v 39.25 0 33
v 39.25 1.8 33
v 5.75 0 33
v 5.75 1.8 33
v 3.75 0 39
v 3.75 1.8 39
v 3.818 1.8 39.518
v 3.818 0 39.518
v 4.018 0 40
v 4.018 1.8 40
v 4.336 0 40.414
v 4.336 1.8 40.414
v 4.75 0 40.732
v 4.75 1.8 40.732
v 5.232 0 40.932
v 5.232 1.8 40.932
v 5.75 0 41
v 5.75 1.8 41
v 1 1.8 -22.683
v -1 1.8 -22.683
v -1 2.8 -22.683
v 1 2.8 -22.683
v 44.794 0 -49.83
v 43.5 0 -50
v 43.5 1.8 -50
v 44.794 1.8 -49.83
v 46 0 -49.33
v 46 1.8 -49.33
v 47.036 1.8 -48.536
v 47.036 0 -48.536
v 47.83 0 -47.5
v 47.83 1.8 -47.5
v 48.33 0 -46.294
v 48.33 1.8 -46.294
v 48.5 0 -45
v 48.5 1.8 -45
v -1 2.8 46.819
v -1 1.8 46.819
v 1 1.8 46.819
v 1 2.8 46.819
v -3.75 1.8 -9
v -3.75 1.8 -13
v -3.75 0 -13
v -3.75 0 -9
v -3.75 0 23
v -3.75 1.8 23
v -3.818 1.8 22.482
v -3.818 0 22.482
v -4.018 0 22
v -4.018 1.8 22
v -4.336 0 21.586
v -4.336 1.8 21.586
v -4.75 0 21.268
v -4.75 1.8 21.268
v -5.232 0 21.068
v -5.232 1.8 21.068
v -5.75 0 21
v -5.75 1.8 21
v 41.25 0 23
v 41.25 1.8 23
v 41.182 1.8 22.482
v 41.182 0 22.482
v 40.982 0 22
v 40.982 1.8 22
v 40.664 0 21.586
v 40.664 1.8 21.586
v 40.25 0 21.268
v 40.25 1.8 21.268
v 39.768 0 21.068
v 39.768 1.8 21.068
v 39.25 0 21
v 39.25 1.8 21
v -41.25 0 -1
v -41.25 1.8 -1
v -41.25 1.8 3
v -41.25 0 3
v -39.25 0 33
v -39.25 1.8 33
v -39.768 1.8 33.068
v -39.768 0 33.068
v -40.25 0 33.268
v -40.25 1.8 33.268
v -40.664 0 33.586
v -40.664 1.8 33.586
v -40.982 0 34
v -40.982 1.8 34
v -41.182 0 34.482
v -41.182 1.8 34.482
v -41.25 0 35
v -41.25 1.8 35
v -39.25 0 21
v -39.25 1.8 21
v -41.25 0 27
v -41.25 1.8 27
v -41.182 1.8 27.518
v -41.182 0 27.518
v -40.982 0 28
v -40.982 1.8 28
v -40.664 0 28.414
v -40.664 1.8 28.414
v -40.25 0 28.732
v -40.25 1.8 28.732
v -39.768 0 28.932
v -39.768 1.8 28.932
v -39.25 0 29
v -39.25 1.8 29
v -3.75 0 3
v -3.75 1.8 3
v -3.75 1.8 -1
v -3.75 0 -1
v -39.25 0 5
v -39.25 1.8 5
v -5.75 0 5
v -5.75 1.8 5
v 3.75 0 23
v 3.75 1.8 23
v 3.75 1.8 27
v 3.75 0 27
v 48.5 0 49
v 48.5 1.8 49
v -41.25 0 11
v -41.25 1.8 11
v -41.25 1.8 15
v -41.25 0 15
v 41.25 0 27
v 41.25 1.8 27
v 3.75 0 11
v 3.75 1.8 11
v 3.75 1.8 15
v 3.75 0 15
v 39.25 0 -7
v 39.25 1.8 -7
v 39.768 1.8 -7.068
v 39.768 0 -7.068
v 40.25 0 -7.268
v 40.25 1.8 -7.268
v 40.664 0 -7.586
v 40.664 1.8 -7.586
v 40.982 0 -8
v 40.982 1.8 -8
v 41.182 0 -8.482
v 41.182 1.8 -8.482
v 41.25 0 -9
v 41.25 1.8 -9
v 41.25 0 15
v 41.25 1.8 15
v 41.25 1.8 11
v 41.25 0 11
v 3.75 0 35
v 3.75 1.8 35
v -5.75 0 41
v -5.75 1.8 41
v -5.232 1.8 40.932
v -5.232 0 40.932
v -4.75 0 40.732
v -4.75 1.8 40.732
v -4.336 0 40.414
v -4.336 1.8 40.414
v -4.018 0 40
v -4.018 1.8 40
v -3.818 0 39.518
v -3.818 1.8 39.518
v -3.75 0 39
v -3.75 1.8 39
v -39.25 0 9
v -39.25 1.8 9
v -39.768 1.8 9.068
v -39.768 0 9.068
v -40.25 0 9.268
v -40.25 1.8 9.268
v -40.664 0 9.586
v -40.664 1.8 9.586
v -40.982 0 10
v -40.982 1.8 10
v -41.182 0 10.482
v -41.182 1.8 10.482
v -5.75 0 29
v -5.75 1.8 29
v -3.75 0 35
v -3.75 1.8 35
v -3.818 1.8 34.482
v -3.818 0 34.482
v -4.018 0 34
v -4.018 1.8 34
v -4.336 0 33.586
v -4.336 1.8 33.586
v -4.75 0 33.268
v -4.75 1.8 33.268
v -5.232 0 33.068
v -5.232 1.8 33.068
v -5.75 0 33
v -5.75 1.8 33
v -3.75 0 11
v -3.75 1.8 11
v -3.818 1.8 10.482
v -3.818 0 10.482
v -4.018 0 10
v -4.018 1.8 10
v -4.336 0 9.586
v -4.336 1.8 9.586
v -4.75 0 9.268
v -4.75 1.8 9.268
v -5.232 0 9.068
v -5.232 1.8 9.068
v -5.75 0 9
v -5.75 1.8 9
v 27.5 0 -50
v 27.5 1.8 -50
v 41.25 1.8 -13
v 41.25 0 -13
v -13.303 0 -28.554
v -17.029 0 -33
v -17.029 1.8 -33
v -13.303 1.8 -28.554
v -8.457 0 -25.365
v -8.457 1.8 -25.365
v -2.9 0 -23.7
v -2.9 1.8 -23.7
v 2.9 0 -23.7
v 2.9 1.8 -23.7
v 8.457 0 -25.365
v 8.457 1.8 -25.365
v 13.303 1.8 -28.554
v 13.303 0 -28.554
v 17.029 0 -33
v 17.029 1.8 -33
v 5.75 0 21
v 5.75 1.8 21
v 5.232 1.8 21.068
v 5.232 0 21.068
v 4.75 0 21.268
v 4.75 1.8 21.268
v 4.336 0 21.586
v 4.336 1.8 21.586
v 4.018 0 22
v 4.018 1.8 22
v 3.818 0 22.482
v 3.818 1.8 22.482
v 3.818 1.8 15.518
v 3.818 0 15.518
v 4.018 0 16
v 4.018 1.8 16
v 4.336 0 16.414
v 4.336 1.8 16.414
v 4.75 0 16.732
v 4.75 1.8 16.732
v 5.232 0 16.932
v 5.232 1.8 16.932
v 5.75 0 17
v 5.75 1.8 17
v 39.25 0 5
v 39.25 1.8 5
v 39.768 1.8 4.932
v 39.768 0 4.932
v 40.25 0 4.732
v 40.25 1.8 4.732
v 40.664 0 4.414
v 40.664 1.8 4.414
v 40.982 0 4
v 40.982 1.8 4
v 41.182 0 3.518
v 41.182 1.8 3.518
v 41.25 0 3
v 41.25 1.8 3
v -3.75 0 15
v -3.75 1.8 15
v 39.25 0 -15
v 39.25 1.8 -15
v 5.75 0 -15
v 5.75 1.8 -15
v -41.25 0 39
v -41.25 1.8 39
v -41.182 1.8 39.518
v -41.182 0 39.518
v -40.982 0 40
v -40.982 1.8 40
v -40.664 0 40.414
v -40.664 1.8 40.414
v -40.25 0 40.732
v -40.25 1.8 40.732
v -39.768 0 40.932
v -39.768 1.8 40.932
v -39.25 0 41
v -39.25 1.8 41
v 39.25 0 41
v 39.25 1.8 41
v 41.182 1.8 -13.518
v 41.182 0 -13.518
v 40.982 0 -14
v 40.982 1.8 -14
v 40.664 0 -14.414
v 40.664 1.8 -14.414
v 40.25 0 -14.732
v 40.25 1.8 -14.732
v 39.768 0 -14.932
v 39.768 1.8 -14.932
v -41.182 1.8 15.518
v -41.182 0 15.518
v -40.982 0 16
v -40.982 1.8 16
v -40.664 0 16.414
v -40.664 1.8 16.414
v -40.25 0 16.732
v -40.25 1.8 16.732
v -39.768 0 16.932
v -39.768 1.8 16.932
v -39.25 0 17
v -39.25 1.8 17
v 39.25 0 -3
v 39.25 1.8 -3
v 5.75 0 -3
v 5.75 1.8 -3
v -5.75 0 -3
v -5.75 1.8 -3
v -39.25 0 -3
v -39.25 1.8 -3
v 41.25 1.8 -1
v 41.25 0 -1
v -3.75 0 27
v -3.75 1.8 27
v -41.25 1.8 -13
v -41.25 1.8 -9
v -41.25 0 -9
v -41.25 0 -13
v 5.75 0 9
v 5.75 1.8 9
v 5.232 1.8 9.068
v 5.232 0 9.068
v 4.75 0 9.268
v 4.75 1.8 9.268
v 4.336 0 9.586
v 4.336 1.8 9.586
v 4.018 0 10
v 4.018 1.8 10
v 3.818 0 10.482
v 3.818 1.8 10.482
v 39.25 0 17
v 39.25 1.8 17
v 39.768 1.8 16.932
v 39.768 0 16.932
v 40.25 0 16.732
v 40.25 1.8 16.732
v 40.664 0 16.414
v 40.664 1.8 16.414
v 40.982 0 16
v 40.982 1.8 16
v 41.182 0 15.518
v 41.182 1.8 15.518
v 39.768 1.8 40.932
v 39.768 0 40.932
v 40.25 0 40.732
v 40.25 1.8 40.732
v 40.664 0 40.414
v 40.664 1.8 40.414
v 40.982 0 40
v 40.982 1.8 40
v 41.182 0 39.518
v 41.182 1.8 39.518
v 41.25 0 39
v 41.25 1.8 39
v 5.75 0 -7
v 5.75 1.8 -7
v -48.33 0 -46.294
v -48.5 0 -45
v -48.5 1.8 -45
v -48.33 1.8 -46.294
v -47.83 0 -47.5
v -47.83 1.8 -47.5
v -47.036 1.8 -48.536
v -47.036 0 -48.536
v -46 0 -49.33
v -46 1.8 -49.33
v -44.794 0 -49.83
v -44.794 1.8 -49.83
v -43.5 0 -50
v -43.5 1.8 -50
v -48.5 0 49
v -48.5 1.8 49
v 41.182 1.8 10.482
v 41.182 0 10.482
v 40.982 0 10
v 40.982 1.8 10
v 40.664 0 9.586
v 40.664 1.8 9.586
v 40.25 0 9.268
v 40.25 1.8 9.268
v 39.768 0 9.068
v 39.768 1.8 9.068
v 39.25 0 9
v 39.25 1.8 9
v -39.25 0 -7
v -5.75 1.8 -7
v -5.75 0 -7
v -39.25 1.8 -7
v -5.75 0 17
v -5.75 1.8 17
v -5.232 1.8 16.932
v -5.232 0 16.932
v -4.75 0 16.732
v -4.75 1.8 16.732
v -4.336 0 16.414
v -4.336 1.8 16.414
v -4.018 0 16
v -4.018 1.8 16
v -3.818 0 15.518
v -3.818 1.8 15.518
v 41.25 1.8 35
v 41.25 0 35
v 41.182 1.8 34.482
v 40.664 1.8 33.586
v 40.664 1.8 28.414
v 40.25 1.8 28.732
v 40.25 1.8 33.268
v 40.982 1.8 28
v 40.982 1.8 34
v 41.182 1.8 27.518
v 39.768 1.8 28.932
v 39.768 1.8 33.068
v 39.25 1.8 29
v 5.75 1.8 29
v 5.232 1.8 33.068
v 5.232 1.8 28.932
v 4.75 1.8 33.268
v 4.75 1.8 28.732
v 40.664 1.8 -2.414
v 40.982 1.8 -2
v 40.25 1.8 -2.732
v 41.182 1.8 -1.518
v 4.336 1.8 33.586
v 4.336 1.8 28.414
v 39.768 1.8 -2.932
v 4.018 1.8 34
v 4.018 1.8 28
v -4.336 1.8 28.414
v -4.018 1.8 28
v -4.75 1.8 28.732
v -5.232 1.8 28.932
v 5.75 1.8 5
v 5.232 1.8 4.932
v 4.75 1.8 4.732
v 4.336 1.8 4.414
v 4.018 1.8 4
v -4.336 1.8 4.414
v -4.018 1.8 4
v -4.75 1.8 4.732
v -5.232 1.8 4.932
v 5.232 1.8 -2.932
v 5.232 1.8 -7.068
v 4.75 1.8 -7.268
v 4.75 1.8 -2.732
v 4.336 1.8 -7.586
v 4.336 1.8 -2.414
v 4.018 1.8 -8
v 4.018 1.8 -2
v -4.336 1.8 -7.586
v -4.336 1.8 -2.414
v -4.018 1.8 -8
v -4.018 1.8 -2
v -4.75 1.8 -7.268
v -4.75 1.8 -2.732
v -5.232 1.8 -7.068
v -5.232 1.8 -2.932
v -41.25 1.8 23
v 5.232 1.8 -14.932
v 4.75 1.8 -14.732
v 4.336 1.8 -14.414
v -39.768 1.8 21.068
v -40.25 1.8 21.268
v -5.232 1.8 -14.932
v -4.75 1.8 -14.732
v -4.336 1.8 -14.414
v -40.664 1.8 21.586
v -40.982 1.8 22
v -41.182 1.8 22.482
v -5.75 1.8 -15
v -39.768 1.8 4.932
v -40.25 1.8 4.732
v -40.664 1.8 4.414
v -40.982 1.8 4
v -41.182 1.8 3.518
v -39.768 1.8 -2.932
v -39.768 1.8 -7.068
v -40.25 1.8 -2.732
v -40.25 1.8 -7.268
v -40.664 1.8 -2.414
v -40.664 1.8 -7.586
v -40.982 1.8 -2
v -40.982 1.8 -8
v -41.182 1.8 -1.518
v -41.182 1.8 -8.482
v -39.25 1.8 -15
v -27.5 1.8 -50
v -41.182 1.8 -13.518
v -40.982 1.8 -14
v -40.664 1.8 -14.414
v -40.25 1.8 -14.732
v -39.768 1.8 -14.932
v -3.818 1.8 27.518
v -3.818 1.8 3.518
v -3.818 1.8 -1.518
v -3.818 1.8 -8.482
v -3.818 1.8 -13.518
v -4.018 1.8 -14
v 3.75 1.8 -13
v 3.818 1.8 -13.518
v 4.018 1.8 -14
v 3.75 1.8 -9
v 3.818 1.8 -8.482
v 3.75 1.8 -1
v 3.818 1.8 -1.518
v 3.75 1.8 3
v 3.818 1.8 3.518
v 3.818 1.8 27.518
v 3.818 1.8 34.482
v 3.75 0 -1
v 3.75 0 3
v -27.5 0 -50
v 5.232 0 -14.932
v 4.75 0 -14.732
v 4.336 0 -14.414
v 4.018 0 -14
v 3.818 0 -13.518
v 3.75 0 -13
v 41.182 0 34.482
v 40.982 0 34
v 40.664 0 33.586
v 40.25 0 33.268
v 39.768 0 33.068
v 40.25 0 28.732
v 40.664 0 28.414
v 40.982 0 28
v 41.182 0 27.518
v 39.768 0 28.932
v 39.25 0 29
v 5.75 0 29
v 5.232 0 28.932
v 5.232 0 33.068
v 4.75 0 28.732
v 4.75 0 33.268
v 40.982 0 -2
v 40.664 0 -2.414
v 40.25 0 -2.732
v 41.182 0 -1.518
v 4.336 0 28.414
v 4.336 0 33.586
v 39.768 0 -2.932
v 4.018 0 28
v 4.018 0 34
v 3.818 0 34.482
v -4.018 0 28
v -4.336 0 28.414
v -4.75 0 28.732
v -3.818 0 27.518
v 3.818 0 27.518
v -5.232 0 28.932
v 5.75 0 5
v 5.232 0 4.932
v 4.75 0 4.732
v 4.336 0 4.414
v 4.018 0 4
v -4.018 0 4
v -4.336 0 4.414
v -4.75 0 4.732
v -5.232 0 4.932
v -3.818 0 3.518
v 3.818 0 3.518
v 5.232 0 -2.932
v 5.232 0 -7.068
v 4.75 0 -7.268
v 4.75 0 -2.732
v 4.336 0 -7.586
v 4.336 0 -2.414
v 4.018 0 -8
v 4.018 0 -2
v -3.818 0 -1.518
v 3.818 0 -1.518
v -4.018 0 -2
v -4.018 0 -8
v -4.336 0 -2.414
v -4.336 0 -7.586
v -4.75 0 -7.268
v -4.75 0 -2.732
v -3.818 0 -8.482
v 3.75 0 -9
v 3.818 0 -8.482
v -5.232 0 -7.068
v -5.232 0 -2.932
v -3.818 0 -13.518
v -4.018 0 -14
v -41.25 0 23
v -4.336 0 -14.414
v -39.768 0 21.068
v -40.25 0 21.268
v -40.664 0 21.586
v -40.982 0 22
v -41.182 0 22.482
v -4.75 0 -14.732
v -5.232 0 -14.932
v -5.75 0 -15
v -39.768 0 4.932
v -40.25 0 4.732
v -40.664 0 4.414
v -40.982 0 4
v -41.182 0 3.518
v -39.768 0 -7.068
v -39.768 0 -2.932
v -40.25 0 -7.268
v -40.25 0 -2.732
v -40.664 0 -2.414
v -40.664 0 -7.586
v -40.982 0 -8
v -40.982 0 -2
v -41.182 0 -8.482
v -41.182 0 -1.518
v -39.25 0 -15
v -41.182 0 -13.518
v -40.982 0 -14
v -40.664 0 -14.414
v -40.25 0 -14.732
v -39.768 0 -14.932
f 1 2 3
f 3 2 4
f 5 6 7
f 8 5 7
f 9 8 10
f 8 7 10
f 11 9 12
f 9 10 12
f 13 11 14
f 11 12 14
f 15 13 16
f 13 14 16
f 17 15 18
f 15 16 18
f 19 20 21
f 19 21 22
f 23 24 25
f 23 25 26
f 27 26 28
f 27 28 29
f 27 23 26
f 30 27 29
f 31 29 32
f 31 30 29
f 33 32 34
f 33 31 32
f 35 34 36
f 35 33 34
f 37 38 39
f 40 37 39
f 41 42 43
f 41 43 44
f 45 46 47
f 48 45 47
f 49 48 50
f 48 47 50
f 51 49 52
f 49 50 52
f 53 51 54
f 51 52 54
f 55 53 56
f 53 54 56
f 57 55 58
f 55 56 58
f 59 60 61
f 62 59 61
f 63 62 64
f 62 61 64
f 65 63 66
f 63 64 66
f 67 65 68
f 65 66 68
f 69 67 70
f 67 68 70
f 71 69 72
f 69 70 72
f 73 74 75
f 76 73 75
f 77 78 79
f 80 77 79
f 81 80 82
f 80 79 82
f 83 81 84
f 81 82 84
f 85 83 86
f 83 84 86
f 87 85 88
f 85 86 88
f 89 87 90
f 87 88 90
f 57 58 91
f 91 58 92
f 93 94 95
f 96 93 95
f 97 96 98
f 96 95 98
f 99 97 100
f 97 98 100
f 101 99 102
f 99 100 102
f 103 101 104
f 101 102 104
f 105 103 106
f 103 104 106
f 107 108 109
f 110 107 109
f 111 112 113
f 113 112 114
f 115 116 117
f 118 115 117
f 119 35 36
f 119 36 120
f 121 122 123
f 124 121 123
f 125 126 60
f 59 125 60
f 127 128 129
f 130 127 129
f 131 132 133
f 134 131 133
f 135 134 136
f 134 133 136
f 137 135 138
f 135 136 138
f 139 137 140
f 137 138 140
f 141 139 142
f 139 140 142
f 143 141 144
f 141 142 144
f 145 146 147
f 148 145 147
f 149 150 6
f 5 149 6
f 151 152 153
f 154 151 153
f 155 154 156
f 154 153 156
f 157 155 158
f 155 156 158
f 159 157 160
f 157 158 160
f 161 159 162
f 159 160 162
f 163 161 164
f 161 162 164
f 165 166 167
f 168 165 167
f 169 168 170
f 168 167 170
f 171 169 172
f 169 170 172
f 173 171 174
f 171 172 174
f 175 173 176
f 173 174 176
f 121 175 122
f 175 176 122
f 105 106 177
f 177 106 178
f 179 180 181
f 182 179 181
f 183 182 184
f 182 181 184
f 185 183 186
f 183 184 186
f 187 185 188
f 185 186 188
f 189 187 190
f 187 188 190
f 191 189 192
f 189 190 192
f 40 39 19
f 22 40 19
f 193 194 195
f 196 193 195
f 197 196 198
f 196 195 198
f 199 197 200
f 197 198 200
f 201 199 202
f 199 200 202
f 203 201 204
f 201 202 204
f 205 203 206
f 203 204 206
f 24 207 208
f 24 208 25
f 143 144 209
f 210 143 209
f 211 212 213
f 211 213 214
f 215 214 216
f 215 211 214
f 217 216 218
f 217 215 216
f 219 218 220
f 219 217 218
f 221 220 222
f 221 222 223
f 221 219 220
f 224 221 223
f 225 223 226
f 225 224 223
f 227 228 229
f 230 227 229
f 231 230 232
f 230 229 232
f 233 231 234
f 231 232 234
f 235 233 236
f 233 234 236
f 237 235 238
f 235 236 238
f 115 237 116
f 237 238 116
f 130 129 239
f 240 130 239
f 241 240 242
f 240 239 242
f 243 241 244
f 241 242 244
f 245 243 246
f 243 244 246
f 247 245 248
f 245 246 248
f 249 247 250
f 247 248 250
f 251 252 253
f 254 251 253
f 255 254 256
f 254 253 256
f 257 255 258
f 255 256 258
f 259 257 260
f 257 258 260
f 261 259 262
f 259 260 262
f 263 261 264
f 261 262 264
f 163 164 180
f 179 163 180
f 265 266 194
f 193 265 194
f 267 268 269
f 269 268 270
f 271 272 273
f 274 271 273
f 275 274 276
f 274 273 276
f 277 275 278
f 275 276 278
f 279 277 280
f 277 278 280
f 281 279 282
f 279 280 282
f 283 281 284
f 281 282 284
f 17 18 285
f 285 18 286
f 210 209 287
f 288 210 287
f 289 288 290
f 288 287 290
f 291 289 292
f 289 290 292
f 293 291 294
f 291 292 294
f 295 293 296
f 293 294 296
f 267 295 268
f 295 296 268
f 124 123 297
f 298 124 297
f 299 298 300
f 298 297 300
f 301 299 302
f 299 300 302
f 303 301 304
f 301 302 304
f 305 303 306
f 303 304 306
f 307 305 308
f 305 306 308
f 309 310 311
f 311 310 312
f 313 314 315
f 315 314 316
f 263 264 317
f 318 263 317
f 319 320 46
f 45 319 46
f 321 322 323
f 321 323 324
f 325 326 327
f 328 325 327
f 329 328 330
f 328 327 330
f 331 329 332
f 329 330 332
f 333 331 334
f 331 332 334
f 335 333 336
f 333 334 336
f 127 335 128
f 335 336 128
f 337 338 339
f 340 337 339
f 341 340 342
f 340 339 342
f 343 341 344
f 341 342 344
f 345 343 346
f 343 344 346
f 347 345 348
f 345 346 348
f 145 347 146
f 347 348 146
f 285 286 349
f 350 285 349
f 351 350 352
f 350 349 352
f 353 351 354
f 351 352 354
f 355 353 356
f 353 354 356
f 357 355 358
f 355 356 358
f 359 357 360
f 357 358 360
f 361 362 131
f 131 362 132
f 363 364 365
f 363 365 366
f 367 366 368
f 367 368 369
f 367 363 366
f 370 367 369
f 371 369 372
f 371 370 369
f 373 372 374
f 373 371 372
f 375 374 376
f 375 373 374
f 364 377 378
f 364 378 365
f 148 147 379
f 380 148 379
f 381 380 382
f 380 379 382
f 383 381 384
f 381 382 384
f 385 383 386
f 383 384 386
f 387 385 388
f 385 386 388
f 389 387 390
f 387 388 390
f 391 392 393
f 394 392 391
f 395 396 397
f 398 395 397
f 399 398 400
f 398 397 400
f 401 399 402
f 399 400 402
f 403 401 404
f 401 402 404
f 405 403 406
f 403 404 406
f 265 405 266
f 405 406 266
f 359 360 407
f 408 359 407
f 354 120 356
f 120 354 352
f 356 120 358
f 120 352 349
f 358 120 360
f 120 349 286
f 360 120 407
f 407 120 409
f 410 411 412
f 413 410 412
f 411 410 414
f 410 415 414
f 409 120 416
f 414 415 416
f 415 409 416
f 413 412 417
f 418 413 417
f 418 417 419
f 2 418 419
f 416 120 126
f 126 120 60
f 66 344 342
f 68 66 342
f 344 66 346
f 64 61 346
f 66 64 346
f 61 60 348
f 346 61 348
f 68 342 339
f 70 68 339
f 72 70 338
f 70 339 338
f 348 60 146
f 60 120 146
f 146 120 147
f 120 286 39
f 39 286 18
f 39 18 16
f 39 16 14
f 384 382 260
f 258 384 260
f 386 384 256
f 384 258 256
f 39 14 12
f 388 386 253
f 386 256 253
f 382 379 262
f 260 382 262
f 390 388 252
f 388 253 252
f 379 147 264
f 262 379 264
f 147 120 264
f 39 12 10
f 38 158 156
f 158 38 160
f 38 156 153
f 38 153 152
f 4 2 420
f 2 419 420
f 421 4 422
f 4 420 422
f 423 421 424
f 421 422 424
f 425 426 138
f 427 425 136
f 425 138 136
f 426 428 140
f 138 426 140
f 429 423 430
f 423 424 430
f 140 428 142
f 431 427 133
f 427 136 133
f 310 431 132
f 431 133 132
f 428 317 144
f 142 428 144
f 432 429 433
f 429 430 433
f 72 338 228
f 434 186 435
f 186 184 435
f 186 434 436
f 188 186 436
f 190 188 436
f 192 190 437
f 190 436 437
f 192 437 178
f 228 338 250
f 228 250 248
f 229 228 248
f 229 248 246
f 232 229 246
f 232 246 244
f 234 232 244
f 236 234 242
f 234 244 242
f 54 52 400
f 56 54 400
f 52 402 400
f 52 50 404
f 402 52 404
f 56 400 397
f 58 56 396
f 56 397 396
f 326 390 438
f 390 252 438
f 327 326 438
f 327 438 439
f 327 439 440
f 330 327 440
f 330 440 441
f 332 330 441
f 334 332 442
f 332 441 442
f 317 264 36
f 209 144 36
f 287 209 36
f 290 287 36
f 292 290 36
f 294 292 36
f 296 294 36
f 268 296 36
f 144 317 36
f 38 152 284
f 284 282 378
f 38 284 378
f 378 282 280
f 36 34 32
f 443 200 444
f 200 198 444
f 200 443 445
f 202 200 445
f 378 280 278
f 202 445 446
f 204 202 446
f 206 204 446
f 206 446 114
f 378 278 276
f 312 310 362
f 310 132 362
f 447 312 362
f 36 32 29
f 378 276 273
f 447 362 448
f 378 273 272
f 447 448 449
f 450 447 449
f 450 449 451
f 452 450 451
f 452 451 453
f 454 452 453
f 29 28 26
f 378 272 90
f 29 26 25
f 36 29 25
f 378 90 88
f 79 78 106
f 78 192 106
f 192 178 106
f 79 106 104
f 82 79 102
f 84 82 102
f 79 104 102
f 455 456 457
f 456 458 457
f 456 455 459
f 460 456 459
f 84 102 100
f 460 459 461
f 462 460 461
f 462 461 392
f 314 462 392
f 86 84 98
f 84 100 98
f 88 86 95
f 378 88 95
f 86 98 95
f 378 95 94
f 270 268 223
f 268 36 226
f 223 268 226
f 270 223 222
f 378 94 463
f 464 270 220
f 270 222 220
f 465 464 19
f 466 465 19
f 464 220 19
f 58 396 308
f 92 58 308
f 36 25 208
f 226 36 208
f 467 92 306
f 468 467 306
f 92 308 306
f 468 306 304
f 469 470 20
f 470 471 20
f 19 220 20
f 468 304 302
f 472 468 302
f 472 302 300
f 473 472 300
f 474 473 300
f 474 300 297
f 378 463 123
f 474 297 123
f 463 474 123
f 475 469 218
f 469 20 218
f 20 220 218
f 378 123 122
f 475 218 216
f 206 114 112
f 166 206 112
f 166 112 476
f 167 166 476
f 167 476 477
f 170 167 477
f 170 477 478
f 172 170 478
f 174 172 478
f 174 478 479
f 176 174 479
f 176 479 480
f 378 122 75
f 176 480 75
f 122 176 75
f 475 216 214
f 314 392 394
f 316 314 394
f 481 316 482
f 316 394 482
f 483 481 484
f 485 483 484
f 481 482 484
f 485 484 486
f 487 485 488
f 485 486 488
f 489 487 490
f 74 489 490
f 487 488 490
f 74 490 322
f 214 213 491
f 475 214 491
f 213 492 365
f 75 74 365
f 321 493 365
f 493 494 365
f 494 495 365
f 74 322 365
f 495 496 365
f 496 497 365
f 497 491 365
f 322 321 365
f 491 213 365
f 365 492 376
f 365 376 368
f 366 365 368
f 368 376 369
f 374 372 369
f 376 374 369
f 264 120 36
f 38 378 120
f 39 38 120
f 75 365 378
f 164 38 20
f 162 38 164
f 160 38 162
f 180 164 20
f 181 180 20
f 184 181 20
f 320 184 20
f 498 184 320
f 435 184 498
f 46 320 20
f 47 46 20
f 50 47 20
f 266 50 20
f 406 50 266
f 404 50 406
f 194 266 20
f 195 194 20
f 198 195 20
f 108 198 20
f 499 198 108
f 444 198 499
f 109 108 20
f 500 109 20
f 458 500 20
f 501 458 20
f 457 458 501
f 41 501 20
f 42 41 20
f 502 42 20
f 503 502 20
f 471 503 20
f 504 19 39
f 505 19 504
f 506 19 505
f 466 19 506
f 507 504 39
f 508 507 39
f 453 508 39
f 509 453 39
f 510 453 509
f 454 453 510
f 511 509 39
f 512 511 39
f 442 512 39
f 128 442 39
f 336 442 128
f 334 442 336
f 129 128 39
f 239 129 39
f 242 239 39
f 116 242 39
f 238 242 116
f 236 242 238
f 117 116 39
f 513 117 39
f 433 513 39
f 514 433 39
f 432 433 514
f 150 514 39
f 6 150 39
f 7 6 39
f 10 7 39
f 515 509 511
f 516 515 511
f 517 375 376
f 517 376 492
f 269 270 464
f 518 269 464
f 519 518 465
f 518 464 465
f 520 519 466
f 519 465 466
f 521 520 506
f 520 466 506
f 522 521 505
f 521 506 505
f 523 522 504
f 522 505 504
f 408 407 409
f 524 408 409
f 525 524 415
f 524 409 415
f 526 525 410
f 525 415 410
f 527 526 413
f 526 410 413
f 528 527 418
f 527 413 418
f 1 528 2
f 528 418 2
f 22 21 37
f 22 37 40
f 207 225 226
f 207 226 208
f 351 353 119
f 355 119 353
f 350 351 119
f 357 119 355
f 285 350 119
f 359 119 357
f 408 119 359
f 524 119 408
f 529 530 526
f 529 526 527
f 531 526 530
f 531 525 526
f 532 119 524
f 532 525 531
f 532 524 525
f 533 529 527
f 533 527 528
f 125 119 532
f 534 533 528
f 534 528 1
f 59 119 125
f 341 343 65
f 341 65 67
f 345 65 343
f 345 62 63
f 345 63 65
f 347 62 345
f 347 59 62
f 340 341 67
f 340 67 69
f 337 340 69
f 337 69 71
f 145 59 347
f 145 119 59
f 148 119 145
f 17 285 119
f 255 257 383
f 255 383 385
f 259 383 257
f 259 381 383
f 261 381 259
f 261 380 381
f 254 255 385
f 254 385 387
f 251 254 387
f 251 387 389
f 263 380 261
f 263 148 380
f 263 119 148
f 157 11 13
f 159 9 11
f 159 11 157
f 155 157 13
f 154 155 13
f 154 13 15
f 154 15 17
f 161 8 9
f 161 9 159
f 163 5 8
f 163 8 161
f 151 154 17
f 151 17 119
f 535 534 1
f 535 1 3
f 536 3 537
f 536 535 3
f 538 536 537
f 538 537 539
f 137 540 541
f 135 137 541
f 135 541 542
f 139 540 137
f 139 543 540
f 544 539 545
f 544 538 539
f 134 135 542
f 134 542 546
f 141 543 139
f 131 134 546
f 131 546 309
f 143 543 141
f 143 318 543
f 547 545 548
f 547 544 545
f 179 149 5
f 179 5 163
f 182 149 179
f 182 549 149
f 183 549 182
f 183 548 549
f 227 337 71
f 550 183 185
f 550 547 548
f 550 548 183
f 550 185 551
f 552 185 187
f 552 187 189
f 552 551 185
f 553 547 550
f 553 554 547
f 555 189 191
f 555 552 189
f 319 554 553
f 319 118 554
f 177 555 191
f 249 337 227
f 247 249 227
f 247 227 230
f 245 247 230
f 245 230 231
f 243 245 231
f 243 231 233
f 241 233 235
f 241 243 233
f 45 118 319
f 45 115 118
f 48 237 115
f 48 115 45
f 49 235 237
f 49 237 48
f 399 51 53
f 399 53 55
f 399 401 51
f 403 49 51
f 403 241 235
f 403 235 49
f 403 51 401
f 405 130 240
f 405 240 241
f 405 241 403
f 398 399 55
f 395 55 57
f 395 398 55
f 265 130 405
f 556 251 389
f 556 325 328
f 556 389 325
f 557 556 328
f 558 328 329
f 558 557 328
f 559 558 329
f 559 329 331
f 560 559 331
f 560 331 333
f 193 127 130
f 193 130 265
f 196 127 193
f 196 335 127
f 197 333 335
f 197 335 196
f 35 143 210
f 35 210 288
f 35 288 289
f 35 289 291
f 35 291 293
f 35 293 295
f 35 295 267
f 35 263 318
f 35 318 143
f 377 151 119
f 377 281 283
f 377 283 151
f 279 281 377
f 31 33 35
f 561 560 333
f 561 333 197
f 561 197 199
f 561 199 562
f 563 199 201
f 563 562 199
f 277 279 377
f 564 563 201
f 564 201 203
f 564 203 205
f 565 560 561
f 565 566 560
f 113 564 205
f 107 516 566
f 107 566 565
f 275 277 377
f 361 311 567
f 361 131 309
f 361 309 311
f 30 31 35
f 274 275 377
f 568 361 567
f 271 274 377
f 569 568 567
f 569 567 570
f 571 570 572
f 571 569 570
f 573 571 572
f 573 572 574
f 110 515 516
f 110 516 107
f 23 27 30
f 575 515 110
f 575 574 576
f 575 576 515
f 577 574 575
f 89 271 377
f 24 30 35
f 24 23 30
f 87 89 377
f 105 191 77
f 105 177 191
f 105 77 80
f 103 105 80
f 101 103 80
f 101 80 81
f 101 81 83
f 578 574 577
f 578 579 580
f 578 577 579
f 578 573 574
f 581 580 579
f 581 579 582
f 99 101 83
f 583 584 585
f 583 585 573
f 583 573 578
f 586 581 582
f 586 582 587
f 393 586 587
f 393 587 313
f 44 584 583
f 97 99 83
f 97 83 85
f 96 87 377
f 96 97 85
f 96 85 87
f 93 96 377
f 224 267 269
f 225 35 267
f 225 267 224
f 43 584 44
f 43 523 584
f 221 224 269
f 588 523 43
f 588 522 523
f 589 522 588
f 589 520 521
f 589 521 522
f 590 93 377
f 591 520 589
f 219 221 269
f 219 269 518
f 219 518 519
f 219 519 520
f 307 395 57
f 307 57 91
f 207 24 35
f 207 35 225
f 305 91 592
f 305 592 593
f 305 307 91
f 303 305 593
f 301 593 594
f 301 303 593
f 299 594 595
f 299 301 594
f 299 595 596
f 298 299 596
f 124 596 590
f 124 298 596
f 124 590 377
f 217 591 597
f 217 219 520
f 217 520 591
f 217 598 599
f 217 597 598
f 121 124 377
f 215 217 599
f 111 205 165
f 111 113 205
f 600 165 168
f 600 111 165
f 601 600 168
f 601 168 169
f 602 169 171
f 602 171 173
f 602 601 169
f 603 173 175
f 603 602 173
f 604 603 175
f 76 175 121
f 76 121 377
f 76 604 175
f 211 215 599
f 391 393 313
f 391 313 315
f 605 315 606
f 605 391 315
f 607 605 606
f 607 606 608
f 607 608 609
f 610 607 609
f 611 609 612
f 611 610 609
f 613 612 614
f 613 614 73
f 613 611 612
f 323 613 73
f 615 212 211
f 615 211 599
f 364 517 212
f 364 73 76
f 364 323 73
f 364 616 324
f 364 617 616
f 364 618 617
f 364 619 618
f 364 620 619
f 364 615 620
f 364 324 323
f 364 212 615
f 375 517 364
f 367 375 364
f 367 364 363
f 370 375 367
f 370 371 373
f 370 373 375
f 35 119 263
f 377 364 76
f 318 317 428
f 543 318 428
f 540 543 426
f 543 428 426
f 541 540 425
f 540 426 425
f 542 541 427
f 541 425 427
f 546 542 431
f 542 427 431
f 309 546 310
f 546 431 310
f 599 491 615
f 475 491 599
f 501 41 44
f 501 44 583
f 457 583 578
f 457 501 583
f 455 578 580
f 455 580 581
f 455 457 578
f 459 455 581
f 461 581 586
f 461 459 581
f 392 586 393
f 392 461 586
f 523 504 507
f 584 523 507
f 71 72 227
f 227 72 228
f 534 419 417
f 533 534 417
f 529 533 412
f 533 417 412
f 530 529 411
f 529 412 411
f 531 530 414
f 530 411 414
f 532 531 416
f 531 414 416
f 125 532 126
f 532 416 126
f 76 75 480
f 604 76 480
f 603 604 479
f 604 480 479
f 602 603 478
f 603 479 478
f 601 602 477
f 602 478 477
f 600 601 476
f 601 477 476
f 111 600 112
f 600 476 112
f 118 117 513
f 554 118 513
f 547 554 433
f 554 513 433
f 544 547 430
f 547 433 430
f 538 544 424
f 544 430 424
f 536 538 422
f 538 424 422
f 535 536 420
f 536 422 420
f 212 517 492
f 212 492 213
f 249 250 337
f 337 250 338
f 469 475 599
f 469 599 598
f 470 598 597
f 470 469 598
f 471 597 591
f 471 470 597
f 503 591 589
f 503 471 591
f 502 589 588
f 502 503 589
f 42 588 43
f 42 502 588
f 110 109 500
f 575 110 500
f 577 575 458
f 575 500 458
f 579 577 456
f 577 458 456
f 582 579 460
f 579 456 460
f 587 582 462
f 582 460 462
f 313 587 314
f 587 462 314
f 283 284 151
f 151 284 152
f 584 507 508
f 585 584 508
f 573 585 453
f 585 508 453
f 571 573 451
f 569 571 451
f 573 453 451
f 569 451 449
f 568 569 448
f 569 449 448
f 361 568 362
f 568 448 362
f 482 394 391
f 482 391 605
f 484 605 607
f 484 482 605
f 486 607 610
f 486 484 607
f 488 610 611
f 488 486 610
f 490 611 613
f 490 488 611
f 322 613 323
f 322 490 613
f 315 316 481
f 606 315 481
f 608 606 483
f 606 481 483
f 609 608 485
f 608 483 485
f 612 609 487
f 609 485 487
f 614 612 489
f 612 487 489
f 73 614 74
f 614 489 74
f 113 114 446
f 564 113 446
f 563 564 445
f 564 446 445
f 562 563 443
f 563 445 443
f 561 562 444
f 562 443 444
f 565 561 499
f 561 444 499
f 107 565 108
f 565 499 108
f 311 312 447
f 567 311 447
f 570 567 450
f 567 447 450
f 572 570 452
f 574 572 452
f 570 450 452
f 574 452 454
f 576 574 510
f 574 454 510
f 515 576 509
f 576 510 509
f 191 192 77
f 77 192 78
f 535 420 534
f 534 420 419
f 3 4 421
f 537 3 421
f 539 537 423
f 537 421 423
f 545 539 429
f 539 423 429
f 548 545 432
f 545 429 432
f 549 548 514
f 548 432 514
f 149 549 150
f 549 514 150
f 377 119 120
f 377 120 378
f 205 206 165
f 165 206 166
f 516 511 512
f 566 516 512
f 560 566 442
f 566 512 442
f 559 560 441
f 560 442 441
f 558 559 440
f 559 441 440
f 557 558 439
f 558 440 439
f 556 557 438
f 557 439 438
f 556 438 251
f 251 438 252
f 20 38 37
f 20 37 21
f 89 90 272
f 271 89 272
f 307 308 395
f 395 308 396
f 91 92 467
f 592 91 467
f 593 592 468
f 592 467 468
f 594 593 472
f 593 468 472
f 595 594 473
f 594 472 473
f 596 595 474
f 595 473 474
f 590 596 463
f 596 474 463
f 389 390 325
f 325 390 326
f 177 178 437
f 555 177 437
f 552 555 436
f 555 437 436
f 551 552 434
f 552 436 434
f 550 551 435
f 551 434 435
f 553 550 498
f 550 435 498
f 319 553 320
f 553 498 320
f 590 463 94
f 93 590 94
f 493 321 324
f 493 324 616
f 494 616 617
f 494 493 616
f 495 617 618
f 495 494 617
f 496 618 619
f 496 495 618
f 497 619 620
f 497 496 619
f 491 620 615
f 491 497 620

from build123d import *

# Parameters (mm, degrees)
GRUNDK_RPER_DEPTH = 1.8
L_FTUNGEN_DEPTH   = 1.8
SKIZZE4_W         = 2
SKIZZE4_H         = 69.501766887
STREBE_DEPTH      = 1


with BuildPart() as part:
    # Skizze2 → Grundkörper (new body)
    with BuildSketch(Plane(origin=(0, 0, 0), x_dir=(1, 0, 0), z_dir=(0, 1, 0))):
        with BuildLine():
            Line((-43.5, 50), (-27.5, 50))
            Line((-27.5, 50), (-17.028881642, 33))
            ThreePointArc((-17.028881642, 33), (0, 23.488907952), (17.028881642, 33))
            Line((17.028881642, 33), (27.5, 50))
            Line((27.5, 50), (43.5, 50))
            ThreePointArc((43.5, 50), (47.035533906, 48.535533906), (48.5, 45))
            Line((48.5, 45), (48.5, -49))
            Line((48.5, -49), (-48.5, -49))
            Line((-48.5, -49), (-48.5, 45))
            ThreePointArc((-48.5, 45), (-47.035533906, 48.535533906), (-43.5, 50))
        make_face()
    extrude(amount=GRUNDK_RPER_DEPTH)

    # Skizze3 → Lüftungen (cut)
    with BuildSketch(Plane(origin=(0, 1.8, 0), x_dir=(1, 0, 0), z_dir=(0, 1, 0))):
        with BuildLine():
            Line((-39.25, 15), (-5.75, 15))
            ThreePointArc((-5.75, 15), (-4.335786438, 14.414213562), (-3.75, 13))
            Line((-3.75, 13), (-3.75, 9))
            ThreePointArc((-3.75, 9), (-4.335786438, 7.585786438), (-5.75, 7))
            Line((-5.75, 7), (-39.25, 7))
            ThreePointArc((-39.25, 7), (-40.664213562, 7.585786438), (-41.25, 9))
            Line((-41.25, 9), (-41.25, 13))
            ThreePointArc((-41.25, 13), (-40.664213562, 14.414213562), (-39.25, 15))
        make_face()
        with BuildLine():
            Line((3.75, 13), (3.75, 9))
            ThreePointArc((3.75, 9), (4.335786438, 7.585786438), (5.75, 7))
            Line((5.75, 7), (39.25, 7))
            ThreePointArc((39.25, 7), (40.664213562, 7.585786438), (41.25, 9))
            Line((41.25, 9), (41.25, 13))
            ThreePointArc((41.25, 13), (40.664213562, 14.414213562), (39.25, 15))
            Line((39.25, 15), (5.75, 15))
            ThreePointArc((5.75, 15), (4.335786438, 14.414213562), (3.75, 13))
        make_face()
        with BuildLine():
            Line((3.75, 1), (3.75, -3))
            ThreePointArc((3.75, -3), (4.335786438, -4.414213562), (5.75, -5))
            Line((5.75, -5), (39.25, -5))
            ThreePointArc((39.25, -5), (40.664213562, -4.414213562), (41.25, -3))
            Line((41.25, -3), (41.25, 1))
            ThreePointArc((41.25, 1), (40.664213562, 2.414213562), (39.25, 3))
            Line((39.25, 3), (5.75, 3))
            ThreePointArc((5.75, 3), (4.335786438, 2.414213562), (3.75, 1))
        make_face()
        with BuildLine():
            Line((3.75, -11), (3.75, -15))
            ThreePointArc((3.75, -15), (4.335786438, -16.414213562), (5.75, -17))
            Line((5.75, -17), (39.25, -17))
            ThreePointArc((39.25, -17), (40.664213562, -16.414213562), (41.25, -15))
            Line((41.25, -15), (41.25, -11))
            ThreePointArc((41.25, -11), (40.664213562, -9.585786438), (39.25, -9))
            Line((39.25, -9), (5.75, -9))
            ThreePointArc((5.75, -9), (4.335786438, -9.585786438), (3.75, -11))
        make_face()
        with BuildLine():
            Line((3.75, -23), (3.75, -27))
            ThreePointArc((3.75, -27), (4.335786438, -28.414213562), (5.75, -29))
            Line((5.75, -29), (39.25, -29))
            ThreePointArc((39.25, -29), (40.664213562, -28.414213562), (41.25, -27))
            Line((41.25, -27), (41.25, -23))
            ThreePointArc((41.25, -23), (40.664213562, -21.585786438), (39.25, -21))
            Line((39.25, -21), (5.75, -21))
            ThreePointArc((5.75, -21), (4.335786438, -21.585786438), (3.75, -23))
        make_face()
        with BuildLine():
            Line((3.75, -35), (3.75, -39))
            ThreePointArc((3.75, -39), (4.335786438, -40.414213562), (5.75, -41))
            Line((5.75, -41), (39.25, -41))
            ThreePointArc((39.25, -41), (40.664213562, -40.414213562), (41.25, -39))
            Line((41.25, -39), (41.25, -35))
            ThreePointArc((41.25, -35), (40.664213562, -33.585786438), (39.25, -33))
            Line((39.25, -33), (5.75, -33))
            ThreePointArc((5.75, -33), (4.335786438, -33.585786438), (3.75, -35))
        make_face()
        with BuildLine():
            Line((-41.25, 1), (-41.25, -3))
            ThreePointArc((-41.25, -3), (-40.664213562, -4.414213562), (-39.25, -5))
            Line((-39.25, -5), (-5.75, -5))
            ThreePointArc((-5.75, -5), (-4.335786438, -4.414213562), (-3.75, -3))
            Line((-3.75, -3), (-3.75, 1))
            ThreePointArc((-3.75, 1), (-4.335786438, 2.414213562), (-5.75, 3))
            Line((-5.75, 3), (-39.25, 3))
            ThreePointArc((-39.25, 3), (-40.664213562, 2.414213562), (-41.25, 1))
        make_face()
        with BuildLine():
            Line((-41.25, -11), (-41.25, -15))
            ThreePointArc((-41.25, -15), (-40.664213562, -16.414213562), (-39.25, -17))
            Line((-39.25, -17), (-5.75, -17))
            ThreePointArc((-5.75, -17), (-4.335786438, -16.414213562), (-3.75, -15))
            Line((-3.75, -15), (-3.75, -11))
            ThreePointArc((-3.75, -11), (-4.335786438, -9.585786438), (-5.75, -9))
            Line((-5.75, -9), (-39.25, -9))
            ThreePointArc((-39.25, -9), (-40.664213562, -9.585786438), (-41.25, -11))
        make_face()
        with BuildLine():
            Line((-41.25, -23), (-41.25, -27))
            ThreePointArc((-41.25, -27), (-40.664213562, -28.414213562), (-39.25, -29))
            Line((-39.25, -29), (-5.75, -29))
            ThreePointArc((-5.75, -29), (-4.335786438, -28.414213562), (-3.75, -27))
            Line((-3.75, -27), (-3.75, -23))
            ThreePointArc((-3.75, -23), (-4.335786438, -21.585786438), (-5.75, -21))
            Line((-5.75, -21), (-39.25, -21))
            ThreePointArc((-39.25, -21), (-40.664213562, -21.585786438), (-41.25, -23))
        make_face()
        with BuildLine():
            Line((-41.25, -35), (-41.25, -39))
            ThreePointArc((-41.25, -39), (-40.664213562, -40.414213562), (-39.25, -41))
            Line((-39.25, -41), (-5.75, -41))
            ThreePointArc((-5.75, -41), (-4.335786438, -40.414213562), (-3.75, -39))
            Line((-3.75, -39), (-3.75, -35))
            ThreePointArc((-3.75, -35), (-4.335786438, -33.585786438), (-5.75, -33))
            Line((-5.75, -33), (-39.25, -33))
            ThreePointArc((-39.25, -33), (-40.664213562, -33.585786438), (-41.25, -35))
        make_face()
    extrude(amount=-L_FTUNGEN_DEPTH, mode=Mode.SUBTRACT)

    # Skizze4 → Strebe (add)
    with BuildSketch(Plane(origin=(0, 1.8, 0), x_dir=(1, 0, 0), z_dir=(0, 1, 0))):
        with Locations((0, -12.068236179)):
            Rectangle(SKIZZE4_W, SKIZZE4_H)
    extrude(amount=STREBE_DEPTH)


solid = part.part
